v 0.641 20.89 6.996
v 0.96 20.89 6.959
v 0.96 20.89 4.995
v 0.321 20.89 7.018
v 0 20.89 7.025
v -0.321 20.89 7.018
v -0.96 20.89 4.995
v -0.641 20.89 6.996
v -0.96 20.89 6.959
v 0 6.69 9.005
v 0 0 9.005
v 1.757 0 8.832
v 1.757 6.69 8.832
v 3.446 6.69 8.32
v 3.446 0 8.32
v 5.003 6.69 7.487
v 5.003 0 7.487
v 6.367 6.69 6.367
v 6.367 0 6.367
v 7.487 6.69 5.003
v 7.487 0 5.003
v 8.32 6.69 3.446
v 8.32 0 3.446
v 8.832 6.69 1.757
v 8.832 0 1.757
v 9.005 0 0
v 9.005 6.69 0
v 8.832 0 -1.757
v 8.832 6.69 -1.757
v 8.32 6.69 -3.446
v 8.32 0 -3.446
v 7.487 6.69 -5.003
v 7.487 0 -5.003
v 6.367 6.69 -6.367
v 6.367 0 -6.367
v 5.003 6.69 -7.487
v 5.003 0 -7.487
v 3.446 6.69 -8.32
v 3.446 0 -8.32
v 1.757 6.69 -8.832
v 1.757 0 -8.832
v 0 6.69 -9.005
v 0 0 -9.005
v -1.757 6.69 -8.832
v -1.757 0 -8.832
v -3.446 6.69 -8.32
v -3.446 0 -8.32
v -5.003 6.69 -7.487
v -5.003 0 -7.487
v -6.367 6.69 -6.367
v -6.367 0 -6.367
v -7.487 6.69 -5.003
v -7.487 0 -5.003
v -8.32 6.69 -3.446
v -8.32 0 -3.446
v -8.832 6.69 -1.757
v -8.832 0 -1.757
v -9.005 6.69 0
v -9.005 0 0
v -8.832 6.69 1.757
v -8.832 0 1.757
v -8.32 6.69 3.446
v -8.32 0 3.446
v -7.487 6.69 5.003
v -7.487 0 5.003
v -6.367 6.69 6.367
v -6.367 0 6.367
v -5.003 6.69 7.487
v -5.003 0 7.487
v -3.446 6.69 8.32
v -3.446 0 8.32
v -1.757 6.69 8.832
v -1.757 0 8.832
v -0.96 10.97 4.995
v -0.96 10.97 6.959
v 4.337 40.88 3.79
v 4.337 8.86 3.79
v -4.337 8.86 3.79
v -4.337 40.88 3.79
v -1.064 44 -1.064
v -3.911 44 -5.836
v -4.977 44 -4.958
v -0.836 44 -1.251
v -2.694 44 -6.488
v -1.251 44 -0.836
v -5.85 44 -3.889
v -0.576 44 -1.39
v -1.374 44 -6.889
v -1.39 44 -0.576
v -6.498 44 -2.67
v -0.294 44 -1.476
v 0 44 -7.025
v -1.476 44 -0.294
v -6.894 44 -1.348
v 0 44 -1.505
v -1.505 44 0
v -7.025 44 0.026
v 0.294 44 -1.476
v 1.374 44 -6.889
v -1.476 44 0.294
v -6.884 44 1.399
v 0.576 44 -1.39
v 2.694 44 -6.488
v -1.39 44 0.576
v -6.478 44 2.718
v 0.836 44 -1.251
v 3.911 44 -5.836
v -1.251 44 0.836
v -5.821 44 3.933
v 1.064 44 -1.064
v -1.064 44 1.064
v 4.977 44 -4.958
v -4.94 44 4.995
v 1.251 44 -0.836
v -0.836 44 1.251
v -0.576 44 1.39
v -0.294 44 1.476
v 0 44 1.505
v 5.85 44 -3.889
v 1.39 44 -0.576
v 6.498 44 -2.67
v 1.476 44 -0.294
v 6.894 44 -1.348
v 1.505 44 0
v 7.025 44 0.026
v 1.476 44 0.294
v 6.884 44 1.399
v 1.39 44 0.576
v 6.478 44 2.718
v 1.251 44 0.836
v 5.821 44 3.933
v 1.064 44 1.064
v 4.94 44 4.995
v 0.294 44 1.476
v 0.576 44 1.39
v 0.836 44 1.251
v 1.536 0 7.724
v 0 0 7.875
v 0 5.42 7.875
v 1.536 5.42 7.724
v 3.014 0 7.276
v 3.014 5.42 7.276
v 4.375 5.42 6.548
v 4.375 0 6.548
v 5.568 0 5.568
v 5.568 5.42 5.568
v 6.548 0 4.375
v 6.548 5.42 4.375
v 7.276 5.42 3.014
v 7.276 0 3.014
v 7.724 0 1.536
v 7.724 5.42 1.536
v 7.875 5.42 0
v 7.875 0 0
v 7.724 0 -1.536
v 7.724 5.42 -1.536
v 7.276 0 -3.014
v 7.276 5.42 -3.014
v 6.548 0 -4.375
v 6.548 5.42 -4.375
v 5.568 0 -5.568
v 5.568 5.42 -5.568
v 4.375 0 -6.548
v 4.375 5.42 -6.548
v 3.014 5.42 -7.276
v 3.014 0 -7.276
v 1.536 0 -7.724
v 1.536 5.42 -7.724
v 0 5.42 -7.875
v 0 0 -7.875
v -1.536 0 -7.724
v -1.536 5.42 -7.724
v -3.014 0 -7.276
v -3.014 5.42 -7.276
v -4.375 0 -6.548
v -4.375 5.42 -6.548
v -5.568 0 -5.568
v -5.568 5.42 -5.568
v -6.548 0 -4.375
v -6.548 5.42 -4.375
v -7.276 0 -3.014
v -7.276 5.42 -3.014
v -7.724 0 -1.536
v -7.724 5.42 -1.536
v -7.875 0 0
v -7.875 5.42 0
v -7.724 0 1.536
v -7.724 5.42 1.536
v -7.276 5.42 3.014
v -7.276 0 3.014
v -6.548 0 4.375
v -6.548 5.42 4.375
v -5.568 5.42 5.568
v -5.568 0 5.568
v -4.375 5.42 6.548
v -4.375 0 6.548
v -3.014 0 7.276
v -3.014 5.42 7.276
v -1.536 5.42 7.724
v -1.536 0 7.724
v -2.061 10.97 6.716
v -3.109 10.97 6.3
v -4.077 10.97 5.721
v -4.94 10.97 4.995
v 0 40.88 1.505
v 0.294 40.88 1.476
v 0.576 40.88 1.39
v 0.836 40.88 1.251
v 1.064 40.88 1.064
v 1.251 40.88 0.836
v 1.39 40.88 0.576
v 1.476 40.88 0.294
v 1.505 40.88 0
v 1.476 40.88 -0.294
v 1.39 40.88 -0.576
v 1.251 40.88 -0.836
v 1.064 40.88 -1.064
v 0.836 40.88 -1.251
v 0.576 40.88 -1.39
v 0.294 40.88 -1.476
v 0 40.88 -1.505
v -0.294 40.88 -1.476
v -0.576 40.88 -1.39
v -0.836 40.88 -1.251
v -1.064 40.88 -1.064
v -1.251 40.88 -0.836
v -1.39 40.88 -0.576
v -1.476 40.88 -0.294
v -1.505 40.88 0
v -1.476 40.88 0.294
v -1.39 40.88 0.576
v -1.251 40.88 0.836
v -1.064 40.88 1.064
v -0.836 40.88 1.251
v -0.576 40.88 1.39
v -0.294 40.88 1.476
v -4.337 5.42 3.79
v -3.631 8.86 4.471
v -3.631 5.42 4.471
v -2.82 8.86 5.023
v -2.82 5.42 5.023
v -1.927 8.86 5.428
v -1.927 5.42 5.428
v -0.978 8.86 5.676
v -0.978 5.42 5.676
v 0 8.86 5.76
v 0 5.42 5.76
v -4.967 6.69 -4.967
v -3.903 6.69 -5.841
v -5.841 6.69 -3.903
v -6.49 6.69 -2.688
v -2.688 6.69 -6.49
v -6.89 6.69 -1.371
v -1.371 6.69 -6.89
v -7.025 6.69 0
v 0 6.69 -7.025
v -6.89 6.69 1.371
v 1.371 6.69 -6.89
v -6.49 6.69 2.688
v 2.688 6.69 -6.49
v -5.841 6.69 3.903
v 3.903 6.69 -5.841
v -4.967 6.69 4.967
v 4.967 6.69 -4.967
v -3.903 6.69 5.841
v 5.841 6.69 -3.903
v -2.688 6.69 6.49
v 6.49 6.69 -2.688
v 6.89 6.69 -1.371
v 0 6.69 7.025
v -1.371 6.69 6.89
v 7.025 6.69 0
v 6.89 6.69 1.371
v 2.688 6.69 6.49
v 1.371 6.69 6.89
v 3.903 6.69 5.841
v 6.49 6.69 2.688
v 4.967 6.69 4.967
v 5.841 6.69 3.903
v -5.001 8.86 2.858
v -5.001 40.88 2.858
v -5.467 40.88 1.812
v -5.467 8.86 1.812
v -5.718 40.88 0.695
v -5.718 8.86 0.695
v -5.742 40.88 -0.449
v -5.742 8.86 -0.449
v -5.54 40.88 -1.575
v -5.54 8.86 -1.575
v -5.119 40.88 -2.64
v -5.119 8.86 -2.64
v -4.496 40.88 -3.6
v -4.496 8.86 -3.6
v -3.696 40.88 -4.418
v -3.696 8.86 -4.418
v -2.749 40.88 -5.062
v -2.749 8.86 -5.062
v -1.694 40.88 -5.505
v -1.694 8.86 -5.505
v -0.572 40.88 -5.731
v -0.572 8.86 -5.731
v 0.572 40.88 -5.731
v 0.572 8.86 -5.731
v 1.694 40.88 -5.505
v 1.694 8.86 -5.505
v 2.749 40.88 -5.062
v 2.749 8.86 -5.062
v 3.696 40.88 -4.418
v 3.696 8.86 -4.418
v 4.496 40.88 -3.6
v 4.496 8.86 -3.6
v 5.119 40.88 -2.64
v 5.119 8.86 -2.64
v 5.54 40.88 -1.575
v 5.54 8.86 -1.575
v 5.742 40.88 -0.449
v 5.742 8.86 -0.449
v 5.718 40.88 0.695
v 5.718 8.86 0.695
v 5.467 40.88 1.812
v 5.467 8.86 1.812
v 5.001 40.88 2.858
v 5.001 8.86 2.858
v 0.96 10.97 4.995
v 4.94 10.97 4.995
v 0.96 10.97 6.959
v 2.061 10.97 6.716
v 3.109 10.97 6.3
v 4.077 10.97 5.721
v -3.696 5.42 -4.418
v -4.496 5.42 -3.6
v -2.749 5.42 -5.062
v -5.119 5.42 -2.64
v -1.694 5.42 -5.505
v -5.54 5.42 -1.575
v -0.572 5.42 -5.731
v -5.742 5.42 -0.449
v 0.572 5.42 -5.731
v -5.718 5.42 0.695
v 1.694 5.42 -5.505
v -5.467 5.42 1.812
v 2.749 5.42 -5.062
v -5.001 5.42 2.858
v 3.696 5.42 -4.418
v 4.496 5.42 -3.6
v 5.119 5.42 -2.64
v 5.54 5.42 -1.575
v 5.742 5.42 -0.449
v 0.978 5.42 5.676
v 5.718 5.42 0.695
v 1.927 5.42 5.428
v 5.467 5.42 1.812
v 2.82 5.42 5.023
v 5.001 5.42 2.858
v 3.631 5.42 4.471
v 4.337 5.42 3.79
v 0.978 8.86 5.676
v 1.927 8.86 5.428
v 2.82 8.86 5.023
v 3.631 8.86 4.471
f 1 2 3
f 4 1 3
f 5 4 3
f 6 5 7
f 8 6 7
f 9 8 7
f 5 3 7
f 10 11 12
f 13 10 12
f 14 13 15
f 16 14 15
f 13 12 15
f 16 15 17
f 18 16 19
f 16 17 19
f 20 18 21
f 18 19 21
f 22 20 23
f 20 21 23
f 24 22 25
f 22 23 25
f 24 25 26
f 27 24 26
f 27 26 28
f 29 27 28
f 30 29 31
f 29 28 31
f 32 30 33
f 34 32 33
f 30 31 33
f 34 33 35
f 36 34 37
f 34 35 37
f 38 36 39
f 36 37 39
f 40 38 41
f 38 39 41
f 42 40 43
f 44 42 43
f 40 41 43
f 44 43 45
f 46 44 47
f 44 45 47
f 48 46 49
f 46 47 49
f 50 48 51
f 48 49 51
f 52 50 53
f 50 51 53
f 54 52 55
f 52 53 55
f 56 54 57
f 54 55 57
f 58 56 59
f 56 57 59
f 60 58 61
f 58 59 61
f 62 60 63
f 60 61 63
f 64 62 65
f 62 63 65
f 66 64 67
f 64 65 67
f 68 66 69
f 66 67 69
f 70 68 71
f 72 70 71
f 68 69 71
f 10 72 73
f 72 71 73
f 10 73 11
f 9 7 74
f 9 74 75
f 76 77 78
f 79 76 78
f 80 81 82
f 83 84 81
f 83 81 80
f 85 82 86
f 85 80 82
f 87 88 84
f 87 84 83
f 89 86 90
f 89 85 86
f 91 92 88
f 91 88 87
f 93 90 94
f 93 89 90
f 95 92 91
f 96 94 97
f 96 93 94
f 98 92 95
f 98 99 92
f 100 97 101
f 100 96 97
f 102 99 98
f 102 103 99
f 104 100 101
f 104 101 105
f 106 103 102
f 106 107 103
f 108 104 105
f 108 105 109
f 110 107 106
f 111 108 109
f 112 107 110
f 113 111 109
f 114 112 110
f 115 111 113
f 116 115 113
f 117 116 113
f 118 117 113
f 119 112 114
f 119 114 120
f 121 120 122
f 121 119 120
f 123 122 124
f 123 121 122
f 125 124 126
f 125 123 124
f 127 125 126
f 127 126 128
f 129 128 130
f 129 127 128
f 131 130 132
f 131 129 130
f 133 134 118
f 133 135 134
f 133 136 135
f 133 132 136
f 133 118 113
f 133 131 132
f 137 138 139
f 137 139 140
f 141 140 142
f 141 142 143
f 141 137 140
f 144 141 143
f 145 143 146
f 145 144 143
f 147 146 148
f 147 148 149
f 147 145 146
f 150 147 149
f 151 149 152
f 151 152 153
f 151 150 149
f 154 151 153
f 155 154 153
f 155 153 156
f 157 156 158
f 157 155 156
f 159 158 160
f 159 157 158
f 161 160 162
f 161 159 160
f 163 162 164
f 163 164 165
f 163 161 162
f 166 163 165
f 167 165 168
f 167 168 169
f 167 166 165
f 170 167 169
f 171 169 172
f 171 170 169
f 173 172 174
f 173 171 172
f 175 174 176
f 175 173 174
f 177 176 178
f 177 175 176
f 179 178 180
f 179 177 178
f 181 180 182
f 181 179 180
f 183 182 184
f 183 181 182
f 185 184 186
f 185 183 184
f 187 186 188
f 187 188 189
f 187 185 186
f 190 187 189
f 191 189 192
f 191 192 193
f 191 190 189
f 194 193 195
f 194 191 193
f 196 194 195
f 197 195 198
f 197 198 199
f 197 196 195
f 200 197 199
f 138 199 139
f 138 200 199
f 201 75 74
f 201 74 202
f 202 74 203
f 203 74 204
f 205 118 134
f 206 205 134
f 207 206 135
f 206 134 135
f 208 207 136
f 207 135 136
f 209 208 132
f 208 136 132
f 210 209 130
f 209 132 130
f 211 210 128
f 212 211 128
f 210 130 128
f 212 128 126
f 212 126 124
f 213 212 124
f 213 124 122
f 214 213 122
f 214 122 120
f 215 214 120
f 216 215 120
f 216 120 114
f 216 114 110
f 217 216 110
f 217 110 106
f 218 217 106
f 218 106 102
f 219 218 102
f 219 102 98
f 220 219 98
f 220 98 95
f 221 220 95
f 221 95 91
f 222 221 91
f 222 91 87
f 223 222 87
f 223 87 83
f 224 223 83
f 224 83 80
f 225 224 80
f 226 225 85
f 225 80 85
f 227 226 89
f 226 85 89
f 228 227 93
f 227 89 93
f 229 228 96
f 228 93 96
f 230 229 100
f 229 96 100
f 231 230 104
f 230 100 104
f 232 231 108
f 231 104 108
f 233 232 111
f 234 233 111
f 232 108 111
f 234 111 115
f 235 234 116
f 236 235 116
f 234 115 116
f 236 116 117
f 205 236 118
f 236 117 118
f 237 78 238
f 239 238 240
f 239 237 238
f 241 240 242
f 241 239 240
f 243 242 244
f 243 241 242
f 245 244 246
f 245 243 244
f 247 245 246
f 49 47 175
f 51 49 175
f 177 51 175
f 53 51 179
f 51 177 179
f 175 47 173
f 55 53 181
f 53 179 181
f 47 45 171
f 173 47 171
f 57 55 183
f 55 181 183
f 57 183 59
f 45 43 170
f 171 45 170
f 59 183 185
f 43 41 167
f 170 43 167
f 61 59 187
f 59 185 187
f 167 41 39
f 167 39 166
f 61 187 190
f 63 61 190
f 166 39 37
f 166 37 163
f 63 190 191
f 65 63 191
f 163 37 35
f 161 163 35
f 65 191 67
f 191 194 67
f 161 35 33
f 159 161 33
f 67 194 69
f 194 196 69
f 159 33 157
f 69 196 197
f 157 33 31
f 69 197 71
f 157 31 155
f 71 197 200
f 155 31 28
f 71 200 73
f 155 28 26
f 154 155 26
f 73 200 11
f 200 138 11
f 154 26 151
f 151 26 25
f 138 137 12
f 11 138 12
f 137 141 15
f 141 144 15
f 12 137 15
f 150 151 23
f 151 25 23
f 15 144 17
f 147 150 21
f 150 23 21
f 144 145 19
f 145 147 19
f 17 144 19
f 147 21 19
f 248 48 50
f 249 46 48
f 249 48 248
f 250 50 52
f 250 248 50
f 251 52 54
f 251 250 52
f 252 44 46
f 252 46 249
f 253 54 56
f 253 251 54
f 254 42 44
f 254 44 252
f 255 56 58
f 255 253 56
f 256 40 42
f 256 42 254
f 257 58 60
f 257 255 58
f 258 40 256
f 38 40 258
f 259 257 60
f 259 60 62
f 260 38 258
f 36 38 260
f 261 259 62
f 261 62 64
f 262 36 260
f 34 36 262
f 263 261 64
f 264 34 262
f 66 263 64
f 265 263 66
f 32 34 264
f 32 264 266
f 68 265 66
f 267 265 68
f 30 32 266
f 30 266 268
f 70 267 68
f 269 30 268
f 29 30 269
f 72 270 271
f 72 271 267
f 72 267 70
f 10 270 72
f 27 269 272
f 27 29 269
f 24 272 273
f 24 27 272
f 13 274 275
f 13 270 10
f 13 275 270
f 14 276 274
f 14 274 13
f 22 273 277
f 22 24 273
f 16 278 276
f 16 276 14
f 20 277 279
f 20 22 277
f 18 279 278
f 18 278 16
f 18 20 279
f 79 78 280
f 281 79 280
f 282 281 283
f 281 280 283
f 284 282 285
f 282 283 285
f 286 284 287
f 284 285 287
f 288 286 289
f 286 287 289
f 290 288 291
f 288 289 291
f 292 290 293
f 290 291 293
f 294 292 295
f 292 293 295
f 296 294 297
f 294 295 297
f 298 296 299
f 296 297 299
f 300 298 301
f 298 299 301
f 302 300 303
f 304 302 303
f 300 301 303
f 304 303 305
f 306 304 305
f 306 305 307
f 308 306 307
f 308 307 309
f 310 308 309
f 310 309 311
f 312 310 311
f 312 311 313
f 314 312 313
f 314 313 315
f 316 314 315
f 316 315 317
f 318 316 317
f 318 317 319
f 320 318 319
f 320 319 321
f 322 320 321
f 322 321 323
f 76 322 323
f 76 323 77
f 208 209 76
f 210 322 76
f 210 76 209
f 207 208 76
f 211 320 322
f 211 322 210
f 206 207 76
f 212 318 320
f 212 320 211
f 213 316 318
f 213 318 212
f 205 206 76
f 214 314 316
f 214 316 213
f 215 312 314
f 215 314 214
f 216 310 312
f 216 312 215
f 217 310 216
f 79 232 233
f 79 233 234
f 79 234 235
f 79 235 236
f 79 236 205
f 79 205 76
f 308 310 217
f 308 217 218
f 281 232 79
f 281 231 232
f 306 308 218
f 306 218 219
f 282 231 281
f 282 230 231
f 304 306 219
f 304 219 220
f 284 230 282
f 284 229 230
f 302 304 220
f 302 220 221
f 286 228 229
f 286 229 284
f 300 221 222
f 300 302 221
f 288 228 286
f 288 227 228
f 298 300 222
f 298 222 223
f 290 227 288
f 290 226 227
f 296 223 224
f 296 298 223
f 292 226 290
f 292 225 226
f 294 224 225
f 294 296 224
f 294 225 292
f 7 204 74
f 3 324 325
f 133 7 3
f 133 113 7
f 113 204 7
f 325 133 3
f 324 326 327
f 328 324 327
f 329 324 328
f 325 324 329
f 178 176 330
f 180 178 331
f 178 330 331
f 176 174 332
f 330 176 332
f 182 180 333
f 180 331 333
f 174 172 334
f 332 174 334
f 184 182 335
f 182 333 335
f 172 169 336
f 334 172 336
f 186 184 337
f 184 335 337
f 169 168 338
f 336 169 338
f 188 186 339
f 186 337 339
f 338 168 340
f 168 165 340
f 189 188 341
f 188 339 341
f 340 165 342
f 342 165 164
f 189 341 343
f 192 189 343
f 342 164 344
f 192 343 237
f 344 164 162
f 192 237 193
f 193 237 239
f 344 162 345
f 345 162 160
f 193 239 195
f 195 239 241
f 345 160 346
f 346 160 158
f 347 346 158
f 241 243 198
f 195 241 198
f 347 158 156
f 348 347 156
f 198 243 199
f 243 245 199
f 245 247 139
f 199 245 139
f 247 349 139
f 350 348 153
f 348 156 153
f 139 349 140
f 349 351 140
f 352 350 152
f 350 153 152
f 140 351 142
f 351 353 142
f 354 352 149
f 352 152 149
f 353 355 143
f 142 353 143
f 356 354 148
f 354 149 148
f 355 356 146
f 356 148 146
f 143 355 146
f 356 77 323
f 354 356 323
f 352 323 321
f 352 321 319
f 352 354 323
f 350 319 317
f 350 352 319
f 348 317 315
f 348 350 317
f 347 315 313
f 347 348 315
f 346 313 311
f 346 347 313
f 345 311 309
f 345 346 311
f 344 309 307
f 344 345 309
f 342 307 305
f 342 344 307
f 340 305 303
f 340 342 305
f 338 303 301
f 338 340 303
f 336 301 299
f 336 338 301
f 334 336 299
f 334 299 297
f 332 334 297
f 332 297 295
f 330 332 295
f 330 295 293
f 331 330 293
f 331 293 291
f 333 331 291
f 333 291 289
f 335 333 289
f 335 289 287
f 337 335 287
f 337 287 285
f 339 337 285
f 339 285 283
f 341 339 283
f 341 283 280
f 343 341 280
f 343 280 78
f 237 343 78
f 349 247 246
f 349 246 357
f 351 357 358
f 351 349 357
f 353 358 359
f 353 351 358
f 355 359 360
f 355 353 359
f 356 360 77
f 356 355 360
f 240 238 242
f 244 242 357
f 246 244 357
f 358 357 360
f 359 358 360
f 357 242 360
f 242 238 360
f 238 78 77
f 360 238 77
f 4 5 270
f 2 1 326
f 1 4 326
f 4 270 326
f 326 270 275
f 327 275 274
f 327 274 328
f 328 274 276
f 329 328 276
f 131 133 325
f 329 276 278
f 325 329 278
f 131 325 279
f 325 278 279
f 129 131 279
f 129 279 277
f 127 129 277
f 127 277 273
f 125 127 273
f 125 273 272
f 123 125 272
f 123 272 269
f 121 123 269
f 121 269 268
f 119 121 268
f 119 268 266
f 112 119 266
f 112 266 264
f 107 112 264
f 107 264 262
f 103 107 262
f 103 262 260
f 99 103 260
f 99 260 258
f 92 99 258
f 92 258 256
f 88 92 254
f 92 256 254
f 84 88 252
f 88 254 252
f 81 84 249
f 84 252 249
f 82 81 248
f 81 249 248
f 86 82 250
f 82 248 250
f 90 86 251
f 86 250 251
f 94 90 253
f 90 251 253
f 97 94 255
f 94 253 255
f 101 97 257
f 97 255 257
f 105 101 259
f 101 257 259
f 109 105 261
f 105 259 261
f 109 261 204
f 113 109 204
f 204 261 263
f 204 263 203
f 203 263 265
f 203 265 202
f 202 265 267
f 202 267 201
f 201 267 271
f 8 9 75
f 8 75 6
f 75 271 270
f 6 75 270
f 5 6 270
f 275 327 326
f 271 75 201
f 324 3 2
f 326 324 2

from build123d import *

# Parameters (mm, degrees)
SKETCH1_R           = 9.005
BASE_RING_DEPTH     = 6.69
SKETCH2_R           = 7.025
MAIN_CYLINDER_DEPTH = 44
CUTOUT_PT1_DEPTH    = 33.03
CUTOUT_PT2_DEPTH    = 23.11
SKETCH5_R           = 1.505
TOP_HOLE_DEPTH      = 46.805895363
SKETCH7_R           = 7.875
CUT_EXTRUDE4_DEPTH  = 5.42
SKETCH8_R           = 5.76
CUT_EXTRUDE5_DEPTH  = 8.86
CUT_EXTRUDE6_DEPTH  = 40.88


with BuildPart() as part:
    # Sketch1 → Base Ring (new body)
    with BuildSketch(Plane(origin=(0, 0, 0), x_dir=(1, 0, 0), z_dir=(0, 1, 0))):
        with Locations(Location((0, 0, 0), (0, 0, 270))):
            Circle(SKETCH1_R)
    extrude(amount=BASE_RING_DEPTH)

    # Sketch2 → Main Cylinder (add)
    with BuildSketch(Plane(origin=(0, 0, 0), x_dir=(1, 0, 0), z_dir=(0, 1, 0))):
        with Locations(Location((0, 0, 0), (0, 0, 270))):
            Circle(SKETCH2_R)
    extrude(amount=MAIN_CYLINDER_DEPTH)

    # Sketch3 → Cutout pt1 (cut)
    with BuildSketch(Plane(origin=(0, 44, 0), x_dir=(1, 0, 0), z_dir=(0, 1, 0))):
        with BuildLine():
            Line((-4.939696347, -4.995), (-0.96, -4.995))
            Line((-0.96, -4.995), (-0.96, -6.959096565))
            ThreePointArc((-0.96, -6.959096565), (-3.109022849, -6.299571567), (-4.939696347, -4.995))
        make_face()
        with BuildLine():
            Line((0.96, -4.995), (0.96, -6.959096565))
            ThreePointArc((0.96, -6.959096565), (3.109022849, -6.299571567), (4.939696347, -4.995))
            Line((4.939696347, -4.995), (0.96, -4.995))
        make_face()
    extrude(amount=-CUTOUT_PT1_DEPTH, mode=Mode.SUBTRACT)

    # Sketch4 → Cutout pt2 (cut)
    with BuildSketch(Plane(origin=(0, 44, 0), x_dir=(1, 0, 0), z_dir=(0, 1, 0))):
        with BuildLine():
            Line((-0.96, -4.995), (0.96, -4.995))
            Line((0.96, -4.995), (0.96, -6.959096565))
            ThreePointArc((0.96, -6.959096565), (0, -7.025), (-0.96, -6.959096565))
            Line((-0.96, -6.959096565), (-0.96, -4.995))
        make_face()
    extrude(amount=-CUTOUT_PT2_DEPTH, mode=Mode.SUBTRACT)

    # Sketch5 → Top Hole (cut, through all)
    with BuildSketch(Plane(origin=(0, 44, 0), x_dir=(1, 0, 0), z_dir=(0, 1, 0))):
        with Locations(Location((0, 0, 0), (0, 0, 270))):
            Circle(SKETCH5_R)
    extrude(amount=-TOP_HOLE_DEPTH, mode=Mode.SUBTRACT)

    # Sketch7 → Cut-Extrude4 (cut)
    with BuildSketch(Plane(origin=(0, 0, 0), x_dir=(1, 0, 0), z_dir=(0, 1, 0))):
        with Locations(Location((0, 0, 0), (0, 0, 270))):
            Circle(SKETCH7_R)
    extrude(amount=CUT_EXTRUDE4_DEPTH, mode=Mode.SUBTRACT)

    # Sketch8 → Cut-Extrude5 (cut)
    with BuildSketch(Plane(origin=(0, 0, 0), x_dir=(1, 0, 0), z_dir=(0, 1, 0))):
        with Locations(Location((0, 0, 0), (0, 0, 270))):
            Circle(SKETCH8_R)
    extrude(amount=CUT_EXTRUDE5_DEPTH, mode=Mode.SUBTRACT)

    # Sketch9 → Cut-Extrude6 (cut)
    with BuildSketch(Plane(origin=(0, 0, 0), x_dir=(1, 0, 0), z_dir=(0, 1, 0))):
        with BuildLine():
            Line((4.33745317, -3.79), (-4.33745317, -3.79))
            ThreePointArc((-4.33745317, -3.79), (0, 5.76), (4.33745317, -3.79))
        make_face()
    extrude(amount=CUT_EXTRUDE6_DEPTH, mode=Mode.SUBTRACT)


solid = part.part
